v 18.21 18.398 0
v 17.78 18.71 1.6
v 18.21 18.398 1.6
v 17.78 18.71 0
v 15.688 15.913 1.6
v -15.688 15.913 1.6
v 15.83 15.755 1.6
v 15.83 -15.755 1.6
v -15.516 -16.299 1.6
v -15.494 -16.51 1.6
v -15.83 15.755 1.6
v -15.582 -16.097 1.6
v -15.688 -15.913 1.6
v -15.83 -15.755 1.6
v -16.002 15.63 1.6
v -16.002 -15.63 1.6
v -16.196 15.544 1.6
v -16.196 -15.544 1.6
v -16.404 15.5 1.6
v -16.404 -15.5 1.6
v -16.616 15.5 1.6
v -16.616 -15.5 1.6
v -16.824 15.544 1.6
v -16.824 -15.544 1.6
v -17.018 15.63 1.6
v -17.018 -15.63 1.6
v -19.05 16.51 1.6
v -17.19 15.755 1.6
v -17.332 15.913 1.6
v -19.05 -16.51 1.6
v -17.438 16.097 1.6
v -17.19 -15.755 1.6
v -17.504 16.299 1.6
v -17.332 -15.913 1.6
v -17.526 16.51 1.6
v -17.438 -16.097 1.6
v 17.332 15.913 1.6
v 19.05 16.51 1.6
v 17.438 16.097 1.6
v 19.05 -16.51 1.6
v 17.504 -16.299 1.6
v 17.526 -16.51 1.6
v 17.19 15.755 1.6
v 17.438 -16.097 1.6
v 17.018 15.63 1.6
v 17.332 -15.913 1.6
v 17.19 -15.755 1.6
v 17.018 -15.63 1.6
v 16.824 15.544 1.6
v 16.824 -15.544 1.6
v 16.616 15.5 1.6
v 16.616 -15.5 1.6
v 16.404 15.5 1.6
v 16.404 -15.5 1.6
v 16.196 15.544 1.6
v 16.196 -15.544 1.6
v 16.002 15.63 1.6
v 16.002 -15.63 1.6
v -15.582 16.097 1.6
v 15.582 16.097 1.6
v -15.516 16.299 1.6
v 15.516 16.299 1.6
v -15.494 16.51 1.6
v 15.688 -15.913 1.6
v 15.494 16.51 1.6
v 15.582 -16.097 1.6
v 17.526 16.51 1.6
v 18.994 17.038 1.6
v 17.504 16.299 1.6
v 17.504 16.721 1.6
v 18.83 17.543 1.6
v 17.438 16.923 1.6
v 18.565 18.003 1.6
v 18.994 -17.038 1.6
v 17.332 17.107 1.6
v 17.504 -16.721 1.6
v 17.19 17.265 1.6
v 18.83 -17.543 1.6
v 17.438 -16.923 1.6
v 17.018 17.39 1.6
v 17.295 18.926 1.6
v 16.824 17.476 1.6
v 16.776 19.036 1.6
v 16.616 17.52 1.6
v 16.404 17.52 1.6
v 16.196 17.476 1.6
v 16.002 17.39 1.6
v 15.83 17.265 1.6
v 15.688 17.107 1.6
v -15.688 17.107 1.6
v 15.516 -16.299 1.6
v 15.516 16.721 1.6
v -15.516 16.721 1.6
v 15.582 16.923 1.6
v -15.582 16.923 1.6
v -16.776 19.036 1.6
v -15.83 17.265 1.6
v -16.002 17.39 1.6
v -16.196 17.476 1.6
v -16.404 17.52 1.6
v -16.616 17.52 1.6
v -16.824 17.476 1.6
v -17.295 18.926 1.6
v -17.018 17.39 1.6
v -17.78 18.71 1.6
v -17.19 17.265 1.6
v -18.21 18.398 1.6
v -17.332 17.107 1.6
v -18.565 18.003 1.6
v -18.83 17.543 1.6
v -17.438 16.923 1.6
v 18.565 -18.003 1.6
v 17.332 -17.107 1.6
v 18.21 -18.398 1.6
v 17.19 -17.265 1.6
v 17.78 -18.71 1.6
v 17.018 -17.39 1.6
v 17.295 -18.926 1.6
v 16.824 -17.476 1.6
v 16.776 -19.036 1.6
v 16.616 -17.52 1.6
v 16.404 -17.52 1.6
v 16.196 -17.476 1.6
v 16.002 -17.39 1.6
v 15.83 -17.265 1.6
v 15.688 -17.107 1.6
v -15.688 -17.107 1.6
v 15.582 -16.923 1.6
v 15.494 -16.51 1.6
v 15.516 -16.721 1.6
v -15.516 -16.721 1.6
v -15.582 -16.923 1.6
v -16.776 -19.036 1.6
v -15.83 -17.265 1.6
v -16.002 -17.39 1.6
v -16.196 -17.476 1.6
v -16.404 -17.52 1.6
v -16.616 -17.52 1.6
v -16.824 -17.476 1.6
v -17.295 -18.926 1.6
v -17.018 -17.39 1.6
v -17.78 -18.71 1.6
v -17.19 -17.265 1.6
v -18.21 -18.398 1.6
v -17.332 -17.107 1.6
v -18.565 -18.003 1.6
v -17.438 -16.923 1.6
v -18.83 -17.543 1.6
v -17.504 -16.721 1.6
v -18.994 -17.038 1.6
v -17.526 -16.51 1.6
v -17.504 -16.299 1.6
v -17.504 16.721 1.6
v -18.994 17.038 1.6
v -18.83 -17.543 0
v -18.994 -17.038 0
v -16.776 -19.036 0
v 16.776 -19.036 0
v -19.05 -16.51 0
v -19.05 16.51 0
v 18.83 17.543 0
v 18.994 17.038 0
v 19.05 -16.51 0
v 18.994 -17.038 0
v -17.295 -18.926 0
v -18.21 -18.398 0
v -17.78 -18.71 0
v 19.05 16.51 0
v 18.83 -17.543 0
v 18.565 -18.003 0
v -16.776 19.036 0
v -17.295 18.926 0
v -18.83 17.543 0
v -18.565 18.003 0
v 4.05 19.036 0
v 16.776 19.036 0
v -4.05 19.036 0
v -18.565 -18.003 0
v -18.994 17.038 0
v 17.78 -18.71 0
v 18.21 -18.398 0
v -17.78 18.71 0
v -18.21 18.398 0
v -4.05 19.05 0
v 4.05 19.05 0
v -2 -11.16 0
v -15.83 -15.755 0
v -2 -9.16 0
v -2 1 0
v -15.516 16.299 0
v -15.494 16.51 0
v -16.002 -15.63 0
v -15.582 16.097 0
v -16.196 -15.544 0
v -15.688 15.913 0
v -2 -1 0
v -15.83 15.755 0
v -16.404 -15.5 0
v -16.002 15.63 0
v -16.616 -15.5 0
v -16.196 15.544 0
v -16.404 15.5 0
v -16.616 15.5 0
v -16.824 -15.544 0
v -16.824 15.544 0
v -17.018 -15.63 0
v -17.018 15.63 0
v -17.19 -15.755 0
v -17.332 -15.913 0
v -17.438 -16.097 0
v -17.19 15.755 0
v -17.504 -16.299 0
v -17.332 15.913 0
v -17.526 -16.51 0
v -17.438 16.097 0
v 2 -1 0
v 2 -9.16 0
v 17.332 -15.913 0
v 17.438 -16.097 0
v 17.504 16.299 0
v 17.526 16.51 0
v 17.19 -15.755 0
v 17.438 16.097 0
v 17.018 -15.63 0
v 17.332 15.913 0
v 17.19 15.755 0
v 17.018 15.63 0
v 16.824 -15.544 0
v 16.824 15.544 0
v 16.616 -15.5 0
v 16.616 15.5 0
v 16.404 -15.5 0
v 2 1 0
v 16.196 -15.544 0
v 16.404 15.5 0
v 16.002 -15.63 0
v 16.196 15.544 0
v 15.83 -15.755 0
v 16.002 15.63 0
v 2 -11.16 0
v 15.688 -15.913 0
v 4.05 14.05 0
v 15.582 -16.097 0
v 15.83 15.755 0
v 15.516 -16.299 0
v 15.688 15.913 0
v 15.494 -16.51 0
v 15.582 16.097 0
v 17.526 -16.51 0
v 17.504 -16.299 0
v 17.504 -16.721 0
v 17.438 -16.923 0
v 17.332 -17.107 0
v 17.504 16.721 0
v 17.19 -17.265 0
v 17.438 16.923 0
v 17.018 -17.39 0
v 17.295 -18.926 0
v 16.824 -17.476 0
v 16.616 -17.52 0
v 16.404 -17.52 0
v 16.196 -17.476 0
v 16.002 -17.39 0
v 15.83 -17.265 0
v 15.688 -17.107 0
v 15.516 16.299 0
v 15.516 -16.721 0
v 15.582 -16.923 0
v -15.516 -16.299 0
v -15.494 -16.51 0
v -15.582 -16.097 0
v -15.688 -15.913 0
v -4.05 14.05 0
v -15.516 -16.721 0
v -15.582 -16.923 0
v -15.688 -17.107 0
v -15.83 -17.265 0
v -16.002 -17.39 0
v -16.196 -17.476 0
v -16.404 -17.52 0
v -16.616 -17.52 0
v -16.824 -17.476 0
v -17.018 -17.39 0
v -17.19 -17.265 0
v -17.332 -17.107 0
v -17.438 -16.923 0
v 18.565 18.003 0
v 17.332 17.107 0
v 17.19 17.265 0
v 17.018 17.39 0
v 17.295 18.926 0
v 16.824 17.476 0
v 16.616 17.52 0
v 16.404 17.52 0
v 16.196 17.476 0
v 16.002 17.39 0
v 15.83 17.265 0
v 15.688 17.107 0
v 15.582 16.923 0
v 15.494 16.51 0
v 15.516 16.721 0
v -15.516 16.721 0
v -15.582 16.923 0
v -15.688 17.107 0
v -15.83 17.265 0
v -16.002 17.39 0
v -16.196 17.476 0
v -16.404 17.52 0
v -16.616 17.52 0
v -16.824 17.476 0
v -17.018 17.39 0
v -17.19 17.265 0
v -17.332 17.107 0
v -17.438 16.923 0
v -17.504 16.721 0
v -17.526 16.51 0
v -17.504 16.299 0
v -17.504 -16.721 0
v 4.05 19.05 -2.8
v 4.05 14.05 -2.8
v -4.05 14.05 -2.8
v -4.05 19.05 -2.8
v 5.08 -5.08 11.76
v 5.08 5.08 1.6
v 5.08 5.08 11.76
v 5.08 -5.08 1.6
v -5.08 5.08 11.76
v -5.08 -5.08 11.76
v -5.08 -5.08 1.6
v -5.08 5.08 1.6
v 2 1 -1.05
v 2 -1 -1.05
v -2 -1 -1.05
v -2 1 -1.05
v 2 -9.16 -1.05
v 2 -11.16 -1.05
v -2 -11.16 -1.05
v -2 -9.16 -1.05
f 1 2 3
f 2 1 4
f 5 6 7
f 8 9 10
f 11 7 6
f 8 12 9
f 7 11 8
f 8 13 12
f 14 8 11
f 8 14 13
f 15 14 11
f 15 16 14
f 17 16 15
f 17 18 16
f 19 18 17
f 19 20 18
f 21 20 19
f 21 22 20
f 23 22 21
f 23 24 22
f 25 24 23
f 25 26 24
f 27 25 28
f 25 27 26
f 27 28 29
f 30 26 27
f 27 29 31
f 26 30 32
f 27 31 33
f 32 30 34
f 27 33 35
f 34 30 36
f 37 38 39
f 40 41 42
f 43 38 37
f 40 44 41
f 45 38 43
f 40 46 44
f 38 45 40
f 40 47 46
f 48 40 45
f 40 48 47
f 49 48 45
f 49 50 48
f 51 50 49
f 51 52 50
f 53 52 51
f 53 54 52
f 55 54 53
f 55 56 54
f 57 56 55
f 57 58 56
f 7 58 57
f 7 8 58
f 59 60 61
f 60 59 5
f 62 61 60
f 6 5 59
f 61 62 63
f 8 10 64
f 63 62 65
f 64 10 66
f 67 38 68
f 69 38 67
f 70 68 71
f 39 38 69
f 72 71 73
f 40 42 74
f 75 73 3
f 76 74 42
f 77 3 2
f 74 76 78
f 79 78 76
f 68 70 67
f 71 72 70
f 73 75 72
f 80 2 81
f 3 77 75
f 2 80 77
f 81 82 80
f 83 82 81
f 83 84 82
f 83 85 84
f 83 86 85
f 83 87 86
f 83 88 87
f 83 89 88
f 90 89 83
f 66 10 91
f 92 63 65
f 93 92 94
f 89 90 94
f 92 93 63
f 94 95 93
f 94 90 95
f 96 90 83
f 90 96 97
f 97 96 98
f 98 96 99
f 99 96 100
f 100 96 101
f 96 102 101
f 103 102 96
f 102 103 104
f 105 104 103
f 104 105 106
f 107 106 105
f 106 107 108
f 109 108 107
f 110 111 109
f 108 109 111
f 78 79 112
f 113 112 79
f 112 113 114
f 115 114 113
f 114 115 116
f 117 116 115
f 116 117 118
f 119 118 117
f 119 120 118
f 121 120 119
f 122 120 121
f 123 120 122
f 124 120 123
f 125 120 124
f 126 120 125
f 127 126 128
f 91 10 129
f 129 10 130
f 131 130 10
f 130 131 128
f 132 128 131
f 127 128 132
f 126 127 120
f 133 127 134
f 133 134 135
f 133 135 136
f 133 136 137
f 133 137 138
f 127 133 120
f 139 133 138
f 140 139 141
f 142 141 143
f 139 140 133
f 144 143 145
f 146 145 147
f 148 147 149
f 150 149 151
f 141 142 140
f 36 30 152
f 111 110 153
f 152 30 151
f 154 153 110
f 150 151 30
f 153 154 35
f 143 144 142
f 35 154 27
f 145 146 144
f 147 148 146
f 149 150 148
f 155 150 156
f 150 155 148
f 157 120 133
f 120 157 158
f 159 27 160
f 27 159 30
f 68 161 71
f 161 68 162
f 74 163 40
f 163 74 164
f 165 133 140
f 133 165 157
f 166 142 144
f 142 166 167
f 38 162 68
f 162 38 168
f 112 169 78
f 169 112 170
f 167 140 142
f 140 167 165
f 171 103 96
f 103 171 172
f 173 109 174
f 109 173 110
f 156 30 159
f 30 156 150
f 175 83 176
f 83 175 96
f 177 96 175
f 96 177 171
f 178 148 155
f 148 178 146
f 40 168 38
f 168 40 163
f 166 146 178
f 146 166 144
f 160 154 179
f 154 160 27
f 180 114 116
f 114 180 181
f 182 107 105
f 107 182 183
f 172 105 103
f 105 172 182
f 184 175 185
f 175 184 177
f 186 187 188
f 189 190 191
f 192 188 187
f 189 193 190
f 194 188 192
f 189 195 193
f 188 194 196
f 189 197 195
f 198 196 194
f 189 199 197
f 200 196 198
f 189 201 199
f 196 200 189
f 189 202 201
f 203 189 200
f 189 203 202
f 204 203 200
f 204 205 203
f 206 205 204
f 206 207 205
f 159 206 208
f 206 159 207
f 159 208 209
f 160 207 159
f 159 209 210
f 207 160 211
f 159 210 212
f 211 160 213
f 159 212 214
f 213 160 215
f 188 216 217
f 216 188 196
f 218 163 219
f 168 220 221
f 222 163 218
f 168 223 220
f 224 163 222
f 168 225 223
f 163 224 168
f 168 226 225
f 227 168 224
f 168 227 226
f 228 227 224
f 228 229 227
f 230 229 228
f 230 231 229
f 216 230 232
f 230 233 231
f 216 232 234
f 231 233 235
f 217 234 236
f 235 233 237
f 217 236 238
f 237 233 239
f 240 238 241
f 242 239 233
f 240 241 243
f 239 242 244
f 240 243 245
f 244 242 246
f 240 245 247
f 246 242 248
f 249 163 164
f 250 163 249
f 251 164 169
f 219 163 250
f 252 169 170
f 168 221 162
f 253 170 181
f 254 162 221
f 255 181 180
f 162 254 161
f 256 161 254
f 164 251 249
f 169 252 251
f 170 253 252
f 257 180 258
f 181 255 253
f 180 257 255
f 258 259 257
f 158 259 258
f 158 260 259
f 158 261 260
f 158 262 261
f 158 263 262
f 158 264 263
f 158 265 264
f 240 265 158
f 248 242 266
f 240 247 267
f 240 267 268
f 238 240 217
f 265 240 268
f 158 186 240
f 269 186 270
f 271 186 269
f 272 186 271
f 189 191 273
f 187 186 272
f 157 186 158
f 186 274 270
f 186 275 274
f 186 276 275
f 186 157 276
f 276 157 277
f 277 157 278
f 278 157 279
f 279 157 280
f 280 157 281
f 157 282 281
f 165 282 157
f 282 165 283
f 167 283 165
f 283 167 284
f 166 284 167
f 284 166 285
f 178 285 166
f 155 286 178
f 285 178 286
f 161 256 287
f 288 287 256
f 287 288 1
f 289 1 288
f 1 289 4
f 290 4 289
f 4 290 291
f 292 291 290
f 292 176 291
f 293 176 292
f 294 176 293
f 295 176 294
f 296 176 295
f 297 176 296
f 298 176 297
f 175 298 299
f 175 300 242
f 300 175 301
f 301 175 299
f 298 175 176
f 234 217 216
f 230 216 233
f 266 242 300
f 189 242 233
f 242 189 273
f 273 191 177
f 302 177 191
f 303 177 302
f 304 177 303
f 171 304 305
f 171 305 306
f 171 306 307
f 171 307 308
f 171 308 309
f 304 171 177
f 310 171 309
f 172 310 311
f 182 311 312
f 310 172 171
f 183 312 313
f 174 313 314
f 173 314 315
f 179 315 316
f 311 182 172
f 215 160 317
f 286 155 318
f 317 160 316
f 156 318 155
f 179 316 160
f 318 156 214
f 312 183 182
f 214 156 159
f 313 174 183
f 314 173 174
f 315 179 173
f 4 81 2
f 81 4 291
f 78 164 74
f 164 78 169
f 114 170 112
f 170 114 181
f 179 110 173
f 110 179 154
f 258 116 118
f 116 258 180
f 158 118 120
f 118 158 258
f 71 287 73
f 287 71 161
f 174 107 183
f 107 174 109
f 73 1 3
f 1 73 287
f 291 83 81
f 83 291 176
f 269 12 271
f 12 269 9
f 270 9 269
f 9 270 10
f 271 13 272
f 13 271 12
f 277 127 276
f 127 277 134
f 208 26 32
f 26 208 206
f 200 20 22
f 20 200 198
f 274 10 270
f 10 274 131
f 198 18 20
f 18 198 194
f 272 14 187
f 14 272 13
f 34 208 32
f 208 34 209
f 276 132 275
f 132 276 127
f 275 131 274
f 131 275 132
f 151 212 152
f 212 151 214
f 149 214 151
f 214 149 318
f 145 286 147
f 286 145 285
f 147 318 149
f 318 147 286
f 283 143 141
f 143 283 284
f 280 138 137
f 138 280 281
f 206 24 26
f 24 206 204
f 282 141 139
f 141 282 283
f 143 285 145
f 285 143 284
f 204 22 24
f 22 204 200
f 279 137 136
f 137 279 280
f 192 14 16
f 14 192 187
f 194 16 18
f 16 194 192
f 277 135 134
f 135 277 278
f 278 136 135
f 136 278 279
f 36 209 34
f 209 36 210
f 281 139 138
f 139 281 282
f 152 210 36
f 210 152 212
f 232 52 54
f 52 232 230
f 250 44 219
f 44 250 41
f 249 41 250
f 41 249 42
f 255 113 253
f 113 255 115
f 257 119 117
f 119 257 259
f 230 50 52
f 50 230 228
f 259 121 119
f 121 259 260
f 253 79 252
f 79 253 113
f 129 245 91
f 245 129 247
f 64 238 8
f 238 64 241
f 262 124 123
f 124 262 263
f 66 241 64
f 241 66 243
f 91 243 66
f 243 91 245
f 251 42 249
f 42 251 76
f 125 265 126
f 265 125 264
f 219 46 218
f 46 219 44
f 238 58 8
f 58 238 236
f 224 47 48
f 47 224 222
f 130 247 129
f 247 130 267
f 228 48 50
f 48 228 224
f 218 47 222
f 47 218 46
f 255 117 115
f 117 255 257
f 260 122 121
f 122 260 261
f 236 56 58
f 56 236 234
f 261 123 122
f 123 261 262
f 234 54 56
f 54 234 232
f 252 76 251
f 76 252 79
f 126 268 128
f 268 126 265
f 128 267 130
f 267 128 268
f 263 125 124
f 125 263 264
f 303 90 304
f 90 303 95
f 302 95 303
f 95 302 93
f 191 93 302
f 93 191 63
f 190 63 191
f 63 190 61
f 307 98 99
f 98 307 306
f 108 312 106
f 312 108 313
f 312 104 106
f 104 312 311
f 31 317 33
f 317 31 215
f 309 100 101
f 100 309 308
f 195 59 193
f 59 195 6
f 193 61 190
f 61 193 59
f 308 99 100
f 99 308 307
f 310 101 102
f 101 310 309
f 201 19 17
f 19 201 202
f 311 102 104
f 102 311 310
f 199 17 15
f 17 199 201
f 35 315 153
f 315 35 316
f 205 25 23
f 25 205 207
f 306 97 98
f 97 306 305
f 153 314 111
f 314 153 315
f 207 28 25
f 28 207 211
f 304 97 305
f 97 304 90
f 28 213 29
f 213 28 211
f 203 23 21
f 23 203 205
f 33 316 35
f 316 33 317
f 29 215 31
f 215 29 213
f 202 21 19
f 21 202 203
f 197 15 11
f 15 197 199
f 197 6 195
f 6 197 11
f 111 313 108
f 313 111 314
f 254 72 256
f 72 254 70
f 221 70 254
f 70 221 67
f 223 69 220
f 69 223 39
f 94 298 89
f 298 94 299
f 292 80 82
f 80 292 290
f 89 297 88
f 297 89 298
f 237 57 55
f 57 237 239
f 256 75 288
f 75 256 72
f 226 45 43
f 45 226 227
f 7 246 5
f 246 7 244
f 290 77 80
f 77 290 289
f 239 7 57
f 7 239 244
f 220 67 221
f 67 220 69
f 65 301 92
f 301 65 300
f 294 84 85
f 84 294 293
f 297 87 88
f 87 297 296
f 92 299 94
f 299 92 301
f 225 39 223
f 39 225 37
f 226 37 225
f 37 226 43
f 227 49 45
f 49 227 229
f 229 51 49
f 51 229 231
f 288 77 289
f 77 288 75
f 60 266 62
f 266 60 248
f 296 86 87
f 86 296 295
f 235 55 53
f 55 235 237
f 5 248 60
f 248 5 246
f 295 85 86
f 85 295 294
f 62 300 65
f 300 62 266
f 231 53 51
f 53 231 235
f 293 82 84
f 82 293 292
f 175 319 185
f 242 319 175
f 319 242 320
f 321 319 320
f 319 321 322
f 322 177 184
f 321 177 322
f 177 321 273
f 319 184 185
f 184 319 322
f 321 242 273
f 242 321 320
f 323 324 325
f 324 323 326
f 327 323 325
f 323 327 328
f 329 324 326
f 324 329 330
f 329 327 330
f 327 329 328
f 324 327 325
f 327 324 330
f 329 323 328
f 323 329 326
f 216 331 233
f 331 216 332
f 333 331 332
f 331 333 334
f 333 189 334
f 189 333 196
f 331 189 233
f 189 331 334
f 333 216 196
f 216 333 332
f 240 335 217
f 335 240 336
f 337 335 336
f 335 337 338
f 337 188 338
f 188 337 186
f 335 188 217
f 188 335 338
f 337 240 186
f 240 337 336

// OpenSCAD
// file: shape-rounded-cube.scad
// Draws a cube with the vertical edges rounded.
// -Joe Walnes

module rounded_cube(width, depth, height, corner_radius) {
	translate([corner_radius, corner_radius, 0]) {
		minkowski() {
			cube([width - corner_radius * 2, depth - corner_radius * 2, height / 2]);	
			cylinder(r=corner_radius, h=height / 2);
		}
	}
}
// file: dimensions.scad
// TimeLantern
// ======
// This file contains all the dimensions used in the TimeLantern.
// -Joe Walnes

// Magic OpenSCAD variable to improve the number of segments used 
// in arcs.
$fs = 0.01;

function mm(m) = m;
function inches(i) = mm(i) * 25.4; // inches -> mm

// --- PCB ---

pcb_width = inches(1.5);
pcb_thickness = inches(0.063);
pcb_corner_radius = inches(0.1);
pcb_hole_radius = inches(0.04);

// --- PCB components ---

lightbox_size = mm(10.16);

usb_width = mm(8.1); // 7.5 + 0.6 for tabs
usb_depth = mm(5);
usb_height = mm(2.8);

sensor_width = mm(4);
sensor_depth = mm(2);
sensor_height = mm(1.05);
sensor_gap_below = mm(1);
second_sensor_offset = inches(0.4);

// --- Base ---

outer_wall = mm(1.2); // take into account max USB male connector protusion. 
lip_height = mm(3);
lip_padding = mm(0.5);

base_height = inches(0.5);
base_floor_thickness = inches(0.1);

standoff_height = inches(0.2); // leave enough room for USB connector and tallest component
standoff_width = inches(0.1);
standoff_corner_radius = inches(0.1);
standoff_hole_radius = inches(0.02);

light_tube_radius = inches(0.1);
light_tube_hole_radius = inches(0.05);
light_tube_clearance_top = inches(0.1);

foot_pad_radius = mm(2.5);
foot_pad_height = mm(0.5);

// --- Lid ---

lid_height = inches(1);
lid_thickness = outer_wall;
// main file
// TimeLantern
// ========
// PCB part. This is just a placeholder for the real PCB so we can see how it looks.
// - Joe Walnes (original design by Andrew Kim)

include <dimensions.scad>;
use <shape-rounded-cube.scad>;

module pcb() {

	translate([-pcb_width / 2, -pcb_width / 2, 0]) {
		difference() {

			// Main board
			rounded_cube(pcb_width, pcb_width, pcb_thickness, pcb_corner_radius);

			// Corner holes
			translate([pcb_corner_radius, pcb_corner_radius, 0]) cylinder(r=pcb_hole_radius, h=pcb_thickness);
			translate([pcb_width - pcb_corner_radius, pcb_corner_radius, 0]) cylinder(r=pcb_hole_radius, h=pcb_thickness);
			translate([pcb_corner_radius, pcb_width - pcb_corner_radius, 0]) cylinder(r=pcb_hole_radius, h=pcb_thickness);
			translate([pcb_width - pcb_corner_radius, pcb_width - pcb_corner_radius, 0]) cylinder(r=pcb_hole_radius, h=pcb_thickness);
		}
	}
	
	// USB connector
	translate([-usb_width / 2, pcb_width / 2 - usb_depth, -usb_height]) cube([usb_width, usb_depth, usb_height]);

	// Lightbox
	translate([-lightbox_size / 2, -lightbox_size / 2, pcb_thickness]) cube(lightbox_size);

	// Sensors
	translate([-sensor_width / 2, -sensor_depth / 2, -sensor_height]) cube([sensor_width, sensor_depth, sensor_height]);
	translate([-sensor_width / 2, -sensor_depth / 2 - second_sensor_offset, -sensor_height]) cube([sensor_width, sensor_depth, sensor_height]);

}


pcb();
